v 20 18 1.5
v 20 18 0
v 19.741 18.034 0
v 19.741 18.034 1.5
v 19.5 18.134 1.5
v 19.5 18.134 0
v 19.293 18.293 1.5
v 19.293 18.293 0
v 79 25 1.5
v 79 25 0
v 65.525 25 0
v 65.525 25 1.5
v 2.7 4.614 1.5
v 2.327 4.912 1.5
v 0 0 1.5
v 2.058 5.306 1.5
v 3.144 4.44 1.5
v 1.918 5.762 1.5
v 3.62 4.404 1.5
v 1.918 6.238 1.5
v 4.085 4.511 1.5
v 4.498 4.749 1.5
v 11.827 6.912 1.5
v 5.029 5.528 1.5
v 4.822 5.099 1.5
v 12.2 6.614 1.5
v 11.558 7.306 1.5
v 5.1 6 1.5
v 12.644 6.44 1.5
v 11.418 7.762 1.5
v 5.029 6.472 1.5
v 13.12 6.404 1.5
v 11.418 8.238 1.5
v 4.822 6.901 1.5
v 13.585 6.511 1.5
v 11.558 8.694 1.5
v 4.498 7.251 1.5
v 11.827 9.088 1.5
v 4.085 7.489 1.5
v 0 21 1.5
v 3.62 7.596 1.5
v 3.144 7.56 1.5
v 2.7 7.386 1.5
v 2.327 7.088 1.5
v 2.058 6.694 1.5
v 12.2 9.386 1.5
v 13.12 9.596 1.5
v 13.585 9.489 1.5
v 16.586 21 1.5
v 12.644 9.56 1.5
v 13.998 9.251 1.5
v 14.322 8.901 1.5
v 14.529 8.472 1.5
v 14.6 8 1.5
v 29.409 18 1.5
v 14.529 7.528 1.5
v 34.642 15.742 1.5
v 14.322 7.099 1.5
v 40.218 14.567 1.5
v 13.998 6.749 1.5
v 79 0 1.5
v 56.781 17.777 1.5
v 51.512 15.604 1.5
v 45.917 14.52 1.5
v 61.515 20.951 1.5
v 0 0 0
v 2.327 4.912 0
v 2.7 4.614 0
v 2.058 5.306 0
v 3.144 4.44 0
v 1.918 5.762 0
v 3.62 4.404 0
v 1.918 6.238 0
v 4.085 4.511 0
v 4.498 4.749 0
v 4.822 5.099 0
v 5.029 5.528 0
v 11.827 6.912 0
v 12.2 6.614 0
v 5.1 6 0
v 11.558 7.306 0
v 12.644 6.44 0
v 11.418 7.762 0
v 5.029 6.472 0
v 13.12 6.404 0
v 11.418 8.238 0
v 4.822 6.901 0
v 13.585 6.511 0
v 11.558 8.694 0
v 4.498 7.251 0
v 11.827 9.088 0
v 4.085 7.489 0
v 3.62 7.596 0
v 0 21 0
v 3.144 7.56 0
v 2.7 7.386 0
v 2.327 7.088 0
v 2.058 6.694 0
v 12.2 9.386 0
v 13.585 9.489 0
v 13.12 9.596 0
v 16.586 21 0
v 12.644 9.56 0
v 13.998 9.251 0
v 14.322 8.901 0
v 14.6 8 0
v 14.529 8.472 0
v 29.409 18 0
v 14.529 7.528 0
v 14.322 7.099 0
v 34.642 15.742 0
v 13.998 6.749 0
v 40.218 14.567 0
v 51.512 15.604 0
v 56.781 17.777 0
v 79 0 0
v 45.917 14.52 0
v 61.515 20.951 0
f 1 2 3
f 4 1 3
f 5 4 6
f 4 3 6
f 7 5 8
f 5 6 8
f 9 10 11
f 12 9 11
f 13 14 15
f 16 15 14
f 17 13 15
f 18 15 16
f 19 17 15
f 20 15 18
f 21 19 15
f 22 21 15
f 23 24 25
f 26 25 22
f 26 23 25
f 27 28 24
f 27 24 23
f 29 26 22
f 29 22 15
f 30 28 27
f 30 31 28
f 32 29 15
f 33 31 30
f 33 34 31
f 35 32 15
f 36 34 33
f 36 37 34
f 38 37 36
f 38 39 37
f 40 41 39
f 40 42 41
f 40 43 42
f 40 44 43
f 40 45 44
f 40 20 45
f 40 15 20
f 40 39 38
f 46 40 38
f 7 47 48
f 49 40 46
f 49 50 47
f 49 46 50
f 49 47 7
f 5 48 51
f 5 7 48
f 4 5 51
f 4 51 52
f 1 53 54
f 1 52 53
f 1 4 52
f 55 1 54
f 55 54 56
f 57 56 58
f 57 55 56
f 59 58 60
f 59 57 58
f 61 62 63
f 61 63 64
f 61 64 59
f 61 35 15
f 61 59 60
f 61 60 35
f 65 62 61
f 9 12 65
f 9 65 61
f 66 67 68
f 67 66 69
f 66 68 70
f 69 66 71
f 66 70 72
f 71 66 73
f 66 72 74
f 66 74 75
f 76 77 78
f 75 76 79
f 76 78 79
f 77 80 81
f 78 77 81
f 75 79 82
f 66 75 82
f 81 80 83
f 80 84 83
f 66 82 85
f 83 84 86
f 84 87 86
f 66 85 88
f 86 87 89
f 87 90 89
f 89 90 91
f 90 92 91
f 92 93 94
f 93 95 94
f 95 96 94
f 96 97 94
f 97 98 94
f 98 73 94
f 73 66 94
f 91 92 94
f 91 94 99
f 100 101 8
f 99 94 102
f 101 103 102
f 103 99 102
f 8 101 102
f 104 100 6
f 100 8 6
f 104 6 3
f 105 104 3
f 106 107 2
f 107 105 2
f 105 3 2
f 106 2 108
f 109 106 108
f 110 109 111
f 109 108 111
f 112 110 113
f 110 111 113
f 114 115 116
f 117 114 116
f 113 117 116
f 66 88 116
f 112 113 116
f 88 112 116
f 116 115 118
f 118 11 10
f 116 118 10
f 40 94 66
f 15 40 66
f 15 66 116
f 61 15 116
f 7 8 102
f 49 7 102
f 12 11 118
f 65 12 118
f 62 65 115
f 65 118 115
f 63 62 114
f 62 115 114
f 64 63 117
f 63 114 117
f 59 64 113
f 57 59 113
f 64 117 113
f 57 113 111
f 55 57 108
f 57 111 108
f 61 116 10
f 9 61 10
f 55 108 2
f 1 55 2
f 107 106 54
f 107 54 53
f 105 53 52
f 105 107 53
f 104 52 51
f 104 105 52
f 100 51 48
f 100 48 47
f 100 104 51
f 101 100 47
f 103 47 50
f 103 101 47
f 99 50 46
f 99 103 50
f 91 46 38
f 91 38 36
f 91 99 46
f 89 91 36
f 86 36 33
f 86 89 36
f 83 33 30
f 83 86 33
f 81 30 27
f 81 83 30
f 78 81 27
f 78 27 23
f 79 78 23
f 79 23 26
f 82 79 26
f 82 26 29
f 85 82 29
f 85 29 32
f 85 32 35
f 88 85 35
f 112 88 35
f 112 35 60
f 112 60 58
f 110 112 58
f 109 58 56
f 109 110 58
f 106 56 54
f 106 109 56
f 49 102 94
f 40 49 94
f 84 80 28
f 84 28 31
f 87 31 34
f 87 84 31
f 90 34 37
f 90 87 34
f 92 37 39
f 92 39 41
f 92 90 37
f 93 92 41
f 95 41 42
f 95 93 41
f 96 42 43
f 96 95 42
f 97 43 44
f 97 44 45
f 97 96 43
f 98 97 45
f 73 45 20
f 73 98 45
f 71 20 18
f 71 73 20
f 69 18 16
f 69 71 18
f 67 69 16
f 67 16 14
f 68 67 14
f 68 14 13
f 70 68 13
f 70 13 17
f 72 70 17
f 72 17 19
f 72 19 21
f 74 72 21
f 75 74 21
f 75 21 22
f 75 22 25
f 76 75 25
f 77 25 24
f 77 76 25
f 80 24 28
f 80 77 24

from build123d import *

# Parameters (mm, degrees)
SKETCH_1_R      = 1.6
EXTRUDE_1_DEPTH = 1.5


with BuildPart() as part:
    # Эскиз1 → Бобышка-Вытянуть1 (new body)
    with BuildSketch(Plane.XY):
        with BuildLine():
            Line((0, 20.99999864), (0, 0))
            Line((0, 0), (79, 0))
            Line((79, 0), (79, 25.0000008))
            Line((79, 25.0000008), (65.525211558, 25.0000008))
            ThreePointArc((65.525211558, 25.0000008), (48.741944539, 14.922513652), (29.408996509, 17.99999956))
            Line((29.408996509, 17.99999956), (20.000212839, 17.99999956))
            ThreePointArc((20.000212839, 17.99999956), (19.617529225, 18.076120064), (19.293105722, 18.292892918))
            Line((19.293105722, 18.292892918), (16.586, 20.99999864))
            Line((16.586, 20.99999864), (0, 20.99999864))
        make_face()
        with Locations((3.5, 6)):
            Circle(SKETCH_1_R, mode=Mode.SUBTRACT)
        with Locations((13, 8)):
            Circle(SKETCH_1_R, mode=Mode.SUBTRACT)
    extrude(amount=EXTRUDE_1_DEPTH)


solid = part.part
